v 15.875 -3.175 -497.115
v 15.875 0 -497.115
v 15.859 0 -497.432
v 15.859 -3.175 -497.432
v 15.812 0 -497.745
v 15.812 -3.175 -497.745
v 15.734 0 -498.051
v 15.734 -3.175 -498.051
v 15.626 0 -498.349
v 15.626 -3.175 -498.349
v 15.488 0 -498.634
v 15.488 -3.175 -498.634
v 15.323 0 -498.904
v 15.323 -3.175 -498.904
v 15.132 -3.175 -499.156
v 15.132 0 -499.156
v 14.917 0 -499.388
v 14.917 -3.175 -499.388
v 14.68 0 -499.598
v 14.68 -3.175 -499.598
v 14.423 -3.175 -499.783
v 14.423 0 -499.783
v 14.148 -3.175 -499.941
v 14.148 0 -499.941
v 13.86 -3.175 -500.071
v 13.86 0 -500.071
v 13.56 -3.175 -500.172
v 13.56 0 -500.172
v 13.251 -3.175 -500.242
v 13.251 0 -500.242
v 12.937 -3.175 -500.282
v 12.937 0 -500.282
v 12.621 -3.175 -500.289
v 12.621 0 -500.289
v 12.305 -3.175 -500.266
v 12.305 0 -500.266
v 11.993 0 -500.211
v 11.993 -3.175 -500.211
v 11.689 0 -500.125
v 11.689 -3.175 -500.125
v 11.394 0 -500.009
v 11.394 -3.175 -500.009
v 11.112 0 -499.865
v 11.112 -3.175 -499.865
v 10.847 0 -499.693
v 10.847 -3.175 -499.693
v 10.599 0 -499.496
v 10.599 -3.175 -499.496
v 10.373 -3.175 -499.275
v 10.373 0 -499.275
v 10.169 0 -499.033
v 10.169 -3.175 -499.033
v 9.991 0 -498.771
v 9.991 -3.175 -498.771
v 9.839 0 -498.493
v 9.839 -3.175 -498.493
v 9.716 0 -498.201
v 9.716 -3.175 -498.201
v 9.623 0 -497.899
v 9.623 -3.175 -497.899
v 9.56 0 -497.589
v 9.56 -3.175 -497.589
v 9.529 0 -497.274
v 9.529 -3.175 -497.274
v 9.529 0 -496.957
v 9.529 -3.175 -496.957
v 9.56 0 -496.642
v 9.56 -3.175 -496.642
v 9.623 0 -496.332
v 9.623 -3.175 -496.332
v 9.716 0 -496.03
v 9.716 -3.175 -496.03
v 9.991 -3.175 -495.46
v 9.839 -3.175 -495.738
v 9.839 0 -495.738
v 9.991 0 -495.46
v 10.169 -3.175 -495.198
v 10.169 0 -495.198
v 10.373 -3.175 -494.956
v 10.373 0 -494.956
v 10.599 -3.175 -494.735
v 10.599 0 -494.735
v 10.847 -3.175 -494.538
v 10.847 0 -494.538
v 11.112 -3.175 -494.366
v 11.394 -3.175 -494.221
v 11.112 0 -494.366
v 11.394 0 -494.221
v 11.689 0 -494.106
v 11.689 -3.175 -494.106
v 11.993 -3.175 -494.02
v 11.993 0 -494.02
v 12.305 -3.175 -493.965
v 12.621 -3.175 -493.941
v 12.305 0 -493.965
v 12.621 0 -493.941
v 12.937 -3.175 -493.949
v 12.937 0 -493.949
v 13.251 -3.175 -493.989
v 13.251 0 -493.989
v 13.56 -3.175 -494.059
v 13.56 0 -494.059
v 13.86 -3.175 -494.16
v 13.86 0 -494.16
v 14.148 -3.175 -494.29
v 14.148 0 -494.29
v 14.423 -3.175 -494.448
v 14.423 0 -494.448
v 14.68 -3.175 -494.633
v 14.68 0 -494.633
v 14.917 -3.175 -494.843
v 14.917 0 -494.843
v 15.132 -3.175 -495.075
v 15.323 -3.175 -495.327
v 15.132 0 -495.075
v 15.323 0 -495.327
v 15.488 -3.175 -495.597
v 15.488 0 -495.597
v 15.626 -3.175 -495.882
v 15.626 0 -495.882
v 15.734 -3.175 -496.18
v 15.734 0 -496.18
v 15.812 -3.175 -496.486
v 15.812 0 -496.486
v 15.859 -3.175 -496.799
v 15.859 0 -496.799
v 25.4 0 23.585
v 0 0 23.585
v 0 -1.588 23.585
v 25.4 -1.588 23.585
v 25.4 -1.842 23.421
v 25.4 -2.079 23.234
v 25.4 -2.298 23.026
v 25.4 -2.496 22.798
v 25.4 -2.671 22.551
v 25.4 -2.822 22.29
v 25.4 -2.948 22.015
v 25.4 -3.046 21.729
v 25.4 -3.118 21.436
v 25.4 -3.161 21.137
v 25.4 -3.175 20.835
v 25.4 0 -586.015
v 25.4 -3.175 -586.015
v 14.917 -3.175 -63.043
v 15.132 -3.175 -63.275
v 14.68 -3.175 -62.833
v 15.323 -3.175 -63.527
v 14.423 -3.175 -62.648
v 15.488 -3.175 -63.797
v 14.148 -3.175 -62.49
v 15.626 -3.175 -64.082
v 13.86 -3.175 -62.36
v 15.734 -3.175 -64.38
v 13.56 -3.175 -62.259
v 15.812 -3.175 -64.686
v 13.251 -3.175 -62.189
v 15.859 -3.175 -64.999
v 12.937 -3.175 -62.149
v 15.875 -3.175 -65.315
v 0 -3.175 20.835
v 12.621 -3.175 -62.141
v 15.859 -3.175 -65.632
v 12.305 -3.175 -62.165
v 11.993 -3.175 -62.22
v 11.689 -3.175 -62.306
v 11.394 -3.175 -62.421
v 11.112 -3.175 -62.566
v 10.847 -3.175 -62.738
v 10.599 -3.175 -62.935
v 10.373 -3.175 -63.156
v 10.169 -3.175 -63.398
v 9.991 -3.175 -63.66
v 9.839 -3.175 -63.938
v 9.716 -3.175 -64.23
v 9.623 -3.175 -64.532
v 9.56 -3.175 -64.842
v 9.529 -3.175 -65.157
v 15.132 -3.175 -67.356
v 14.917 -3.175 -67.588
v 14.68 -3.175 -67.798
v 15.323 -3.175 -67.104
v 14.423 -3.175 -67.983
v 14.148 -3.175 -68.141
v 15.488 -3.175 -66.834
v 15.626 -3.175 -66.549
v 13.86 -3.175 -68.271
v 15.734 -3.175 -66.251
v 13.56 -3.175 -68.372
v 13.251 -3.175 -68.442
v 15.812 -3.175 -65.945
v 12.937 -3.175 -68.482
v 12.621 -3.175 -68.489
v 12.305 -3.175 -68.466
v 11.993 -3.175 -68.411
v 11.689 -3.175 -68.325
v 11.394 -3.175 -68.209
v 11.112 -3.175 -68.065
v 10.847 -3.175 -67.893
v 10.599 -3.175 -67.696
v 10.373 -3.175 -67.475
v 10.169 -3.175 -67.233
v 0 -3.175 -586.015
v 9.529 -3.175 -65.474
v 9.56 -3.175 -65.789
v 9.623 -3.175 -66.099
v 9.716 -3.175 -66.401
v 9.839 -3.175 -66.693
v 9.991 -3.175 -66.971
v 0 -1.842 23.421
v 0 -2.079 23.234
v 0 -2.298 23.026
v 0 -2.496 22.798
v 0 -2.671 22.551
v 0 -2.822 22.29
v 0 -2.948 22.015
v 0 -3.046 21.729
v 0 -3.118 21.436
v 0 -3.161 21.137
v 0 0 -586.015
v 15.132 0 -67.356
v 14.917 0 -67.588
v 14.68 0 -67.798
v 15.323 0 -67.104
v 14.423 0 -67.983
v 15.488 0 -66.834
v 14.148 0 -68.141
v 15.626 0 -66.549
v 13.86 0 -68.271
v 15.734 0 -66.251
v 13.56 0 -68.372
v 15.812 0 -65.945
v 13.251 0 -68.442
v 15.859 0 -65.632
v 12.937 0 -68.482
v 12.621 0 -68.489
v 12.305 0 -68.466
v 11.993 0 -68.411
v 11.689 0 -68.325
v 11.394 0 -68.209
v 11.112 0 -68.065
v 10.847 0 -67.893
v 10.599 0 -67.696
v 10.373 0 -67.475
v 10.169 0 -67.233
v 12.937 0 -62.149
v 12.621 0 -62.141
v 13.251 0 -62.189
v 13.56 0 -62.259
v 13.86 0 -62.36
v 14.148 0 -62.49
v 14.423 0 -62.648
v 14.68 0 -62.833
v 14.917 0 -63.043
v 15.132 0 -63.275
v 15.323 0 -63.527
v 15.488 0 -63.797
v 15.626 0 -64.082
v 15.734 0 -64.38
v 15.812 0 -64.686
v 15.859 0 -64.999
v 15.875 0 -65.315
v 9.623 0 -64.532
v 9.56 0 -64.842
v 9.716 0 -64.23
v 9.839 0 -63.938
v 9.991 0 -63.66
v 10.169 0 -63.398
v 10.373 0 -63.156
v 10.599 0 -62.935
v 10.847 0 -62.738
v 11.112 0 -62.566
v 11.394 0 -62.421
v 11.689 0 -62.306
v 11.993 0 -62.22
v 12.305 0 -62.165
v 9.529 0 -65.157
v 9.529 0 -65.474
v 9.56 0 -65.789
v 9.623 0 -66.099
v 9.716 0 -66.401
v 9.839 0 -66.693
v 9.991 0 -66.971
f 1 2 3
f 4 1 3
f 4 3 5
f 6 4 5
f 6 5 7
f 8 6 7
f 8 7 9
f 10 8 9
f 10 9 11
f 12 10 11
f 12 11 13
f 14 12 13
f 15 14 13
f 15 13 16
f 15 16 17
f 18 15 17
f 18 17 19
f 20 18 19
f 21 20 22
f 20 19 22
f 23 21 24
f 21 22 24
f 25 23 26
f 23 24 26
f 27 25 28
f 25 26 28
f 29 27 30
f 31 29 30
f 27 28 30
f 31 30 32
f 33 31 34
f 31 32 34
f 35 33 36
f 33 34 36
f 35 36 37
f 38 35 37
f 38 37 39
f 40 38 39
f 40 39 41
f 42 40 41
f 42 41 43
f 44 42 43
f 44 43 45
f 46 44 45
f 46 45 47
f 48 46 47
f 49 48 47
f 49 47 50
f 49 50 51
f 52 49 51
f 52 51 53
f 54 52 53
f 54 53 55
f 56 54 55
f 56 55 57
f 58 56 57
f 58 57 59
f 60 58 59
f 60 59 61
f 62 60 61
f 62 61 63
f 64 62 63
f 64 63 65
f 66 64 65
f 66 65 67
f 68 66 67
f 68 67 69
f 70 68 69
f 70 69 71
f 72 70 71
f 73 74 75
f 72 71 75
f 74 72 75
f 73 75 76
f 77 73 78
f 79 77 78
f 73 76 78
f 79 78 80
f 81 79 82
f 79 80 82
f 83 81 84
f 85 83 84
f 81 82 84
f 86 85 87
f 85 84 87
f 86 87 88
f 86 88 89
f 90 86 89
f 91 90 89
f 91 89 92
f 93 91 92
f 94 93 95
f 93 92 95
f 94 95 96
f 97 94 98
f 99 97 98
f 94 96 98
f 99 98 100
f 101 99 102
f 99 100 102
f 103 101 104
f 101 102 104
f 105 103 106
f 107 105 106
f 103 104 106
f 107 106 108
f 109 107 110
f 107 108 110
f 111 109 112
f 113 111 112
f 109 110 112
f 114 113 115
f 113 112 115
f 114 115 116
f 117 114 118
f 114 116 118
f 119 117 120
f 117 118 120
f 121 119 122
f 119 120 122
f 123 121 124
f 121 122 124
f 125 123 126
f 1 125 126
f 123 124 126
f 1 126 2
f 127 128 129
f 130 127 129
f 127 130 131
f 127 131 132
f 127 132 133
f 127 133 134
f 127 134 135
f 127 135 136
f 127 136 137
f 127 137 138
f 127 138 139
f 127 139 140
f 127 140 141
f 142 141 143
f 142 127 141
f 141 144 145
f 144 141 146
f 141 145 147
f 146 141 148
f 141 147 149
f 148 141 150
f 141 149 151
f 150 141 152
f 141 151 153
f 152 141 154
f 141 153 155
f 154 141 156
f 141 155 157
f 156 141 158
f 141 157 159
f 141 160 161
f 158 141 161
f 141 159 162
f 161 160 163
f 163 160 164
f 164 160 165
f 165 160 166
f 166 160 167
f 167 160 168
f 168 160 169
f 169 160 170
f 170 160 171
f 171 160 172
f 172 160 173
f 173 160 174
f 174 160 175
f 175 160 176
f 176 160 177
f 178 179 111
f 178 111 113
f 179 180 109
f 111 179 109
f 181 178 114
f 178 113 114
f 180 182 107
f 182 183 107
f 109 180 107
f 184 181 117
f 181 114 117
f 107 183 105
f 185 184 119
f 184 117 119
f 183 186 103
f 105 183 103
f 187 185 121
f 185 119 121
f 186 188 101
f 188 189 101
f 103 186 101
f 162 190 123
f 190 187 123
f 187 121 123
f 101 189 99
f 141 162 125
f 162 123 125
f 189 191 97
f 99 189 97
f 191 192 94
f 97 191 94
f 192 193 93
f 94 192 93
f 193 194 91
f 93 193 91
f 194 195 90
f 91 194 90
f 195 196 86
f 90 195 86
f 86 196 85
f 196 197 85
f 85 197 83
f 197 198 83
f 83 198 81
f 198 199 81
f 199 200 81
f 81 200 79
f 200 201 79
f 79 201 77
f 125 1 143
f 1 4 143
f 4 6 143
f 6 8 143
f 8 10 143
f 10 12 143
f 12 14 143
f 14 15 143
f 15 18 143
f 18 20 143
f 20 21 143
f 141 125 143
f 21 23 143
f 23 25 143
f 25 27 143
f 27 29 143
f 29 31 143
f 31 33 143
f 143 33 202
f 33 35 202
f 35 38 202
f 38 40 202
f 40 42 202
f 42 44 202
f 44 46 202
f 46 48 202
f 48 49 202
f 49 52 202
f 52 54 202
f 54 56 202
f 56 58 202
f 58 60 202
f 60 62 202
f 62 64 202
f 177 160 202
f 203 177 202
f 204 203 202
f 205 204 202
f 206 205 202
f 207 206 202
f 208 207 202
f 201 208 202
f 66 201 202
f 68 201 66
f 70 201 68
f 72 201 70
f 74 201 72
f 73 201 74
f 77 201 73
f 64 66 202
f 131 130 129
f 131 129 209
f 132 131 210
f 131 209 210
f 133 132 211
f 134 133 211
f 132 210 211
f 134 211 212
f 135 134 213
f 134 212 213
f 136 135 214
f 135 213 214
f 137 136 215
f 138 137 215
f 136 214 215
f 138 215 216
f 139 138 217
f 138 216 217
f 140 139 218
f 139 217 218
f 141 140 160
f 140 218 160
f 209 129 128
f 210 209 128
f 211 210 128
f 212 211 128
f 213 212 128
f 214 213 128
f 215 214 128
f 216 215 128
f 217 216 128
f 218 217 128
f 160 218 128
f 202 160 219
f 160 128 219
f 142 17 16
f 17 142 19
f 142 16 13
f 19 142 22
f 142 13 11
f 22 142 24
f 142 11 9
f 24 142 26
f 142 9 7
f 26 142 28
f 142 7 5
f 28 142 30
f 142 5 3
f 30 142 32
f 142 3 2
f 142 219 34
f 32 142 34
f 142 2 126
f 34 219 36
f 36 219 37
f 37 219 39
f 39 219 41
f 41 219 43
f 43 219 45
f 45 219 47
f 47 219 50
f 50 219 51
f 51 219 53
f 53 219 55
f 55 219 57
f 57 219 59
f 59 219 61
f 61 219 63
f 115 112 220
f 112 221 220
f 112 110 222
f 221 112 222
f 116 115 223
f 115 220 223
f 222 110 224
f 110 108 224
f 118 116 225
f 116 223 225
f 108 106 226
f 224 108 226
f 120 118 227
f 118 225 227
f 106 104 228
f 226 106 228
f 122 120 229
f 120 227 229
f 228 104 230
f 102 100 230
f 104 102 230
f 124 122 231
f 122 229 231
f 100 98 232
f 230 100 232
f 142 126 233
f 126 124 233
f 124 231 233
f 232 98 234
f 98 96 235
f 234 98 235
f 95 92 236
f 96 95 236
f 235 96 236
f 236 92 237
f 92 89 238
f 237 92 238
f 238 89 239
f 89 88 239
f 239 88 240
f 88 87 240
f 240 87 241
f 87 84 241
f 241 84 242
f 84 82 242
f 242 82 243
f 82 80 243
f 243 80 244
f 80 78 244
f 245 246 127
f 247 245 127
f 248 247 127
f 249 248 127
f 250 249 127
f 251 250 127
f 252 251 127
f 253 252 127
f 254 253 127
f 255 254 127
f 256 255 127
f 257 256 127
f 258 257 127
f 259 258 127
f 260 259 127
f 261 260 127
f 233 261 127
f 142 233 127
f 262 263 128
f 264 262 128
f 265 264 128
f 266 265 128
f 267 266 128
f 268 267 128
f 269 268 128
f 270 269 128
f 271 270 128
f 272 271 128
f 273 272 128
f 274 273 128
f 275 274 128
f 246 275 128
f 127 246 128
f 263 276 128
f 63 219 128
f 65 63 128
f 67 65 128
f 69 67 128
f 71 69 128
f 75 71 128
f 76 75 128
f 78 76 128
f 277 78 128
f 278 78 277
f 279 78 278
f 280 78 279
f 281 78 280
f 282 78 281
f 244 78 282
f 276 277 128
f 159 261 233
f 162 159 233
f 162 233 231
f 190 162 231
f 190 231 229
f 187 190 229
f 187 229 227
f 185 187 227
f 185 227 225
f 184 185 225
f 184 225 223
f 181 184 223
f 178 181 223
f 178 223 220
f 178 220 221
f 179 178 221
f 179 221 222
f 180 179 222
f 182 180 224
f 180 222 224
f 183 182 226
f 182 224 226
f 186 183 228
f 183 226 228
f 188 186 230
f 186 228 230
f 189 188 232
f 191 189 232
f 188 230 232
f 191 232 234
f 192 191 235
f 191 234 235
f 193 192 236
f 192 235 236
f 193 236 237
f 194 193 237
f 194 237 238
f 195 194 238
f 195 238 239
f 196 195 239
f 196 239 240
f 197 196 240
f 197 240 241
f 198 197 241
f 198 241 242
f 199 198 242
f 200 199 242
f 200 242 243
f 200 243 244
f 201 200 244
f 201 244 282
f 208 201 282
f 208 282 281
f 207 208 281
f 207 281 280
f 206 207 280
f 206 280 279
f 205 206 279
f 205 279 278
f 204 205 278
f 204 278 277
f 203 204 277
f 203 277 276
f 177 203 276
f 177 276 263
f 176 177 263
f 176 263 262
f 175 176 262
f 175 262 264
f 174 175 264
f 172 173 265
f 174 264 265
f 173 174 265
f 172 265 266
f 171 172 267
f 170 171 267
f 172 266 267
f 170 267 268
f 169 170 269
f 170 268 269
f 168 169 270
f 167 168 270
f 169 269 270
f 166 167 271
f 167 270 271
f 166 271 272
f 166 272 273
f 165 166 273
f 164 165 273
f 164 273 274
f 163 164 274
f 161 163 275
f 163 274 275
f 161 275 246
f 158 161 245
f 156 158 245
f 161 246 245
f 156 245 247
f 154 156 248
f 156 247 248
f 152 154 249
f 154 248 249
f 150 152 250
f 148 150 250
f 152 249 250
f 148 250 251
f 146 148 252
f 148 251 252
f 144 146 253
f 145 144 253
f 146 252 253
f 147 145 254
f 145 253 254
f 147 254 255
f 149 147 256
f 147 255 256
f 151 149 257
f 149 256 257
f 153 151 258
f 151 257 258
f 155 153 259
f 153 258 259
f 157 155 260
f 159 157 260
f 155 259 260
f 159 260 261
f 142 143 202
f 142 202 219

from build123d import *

# Parameters (mm, degrees)
BOSS_EXTRUDE1_DEPTH = 25.4
SKETCH2_R           = 3.175
CUT_EXTRUDE1_DEPTH  = 4.175


with BuildPart() as part:
    # Sketch1 → Boss-Extrude1 (new body)
    with BuildSketch(Plane(origin=(0, 0, 0), x_dir=(0, 0, -1), z_dir=(1, 0, 0))):
        with BuildLine():
            Line((-23.584545256, 0), (-23.584545256, -1.5875))
            ThreePointArc((-23.584545256, -1.5875), (-22.422414599, -2.749630657), (-20.834914599, -3.175))
            Line((-20.834914599, -3.175), (586.015454744, -3.175))
            Line((586.015454744, -3.175), (586.015454744, 0))
            Line((586.015454744, 0), (-23.584545256, 0))
        make_face()
    extrude(amount=BOSS_EXTRUDE1_DEPTH)

    # Sketch2 → Cut-Extrude1 (cut, through all)
    with BuildSketch(Plane(origin=(0, 0, 0), x_dir=(1, 0, 0), z_dir=(0, 1, 0))):
        with Locations((12.7, 65.315454744)):
            Circle(SKETCH2_R)
        with Locations((12.7, 497.115454744)):
            Circle(SKETCH2_R)
    extrude(amount=-CUT_EXTRUDE1_DEPTH, mode=Mode.SUBTRACT)


solid = part.part
